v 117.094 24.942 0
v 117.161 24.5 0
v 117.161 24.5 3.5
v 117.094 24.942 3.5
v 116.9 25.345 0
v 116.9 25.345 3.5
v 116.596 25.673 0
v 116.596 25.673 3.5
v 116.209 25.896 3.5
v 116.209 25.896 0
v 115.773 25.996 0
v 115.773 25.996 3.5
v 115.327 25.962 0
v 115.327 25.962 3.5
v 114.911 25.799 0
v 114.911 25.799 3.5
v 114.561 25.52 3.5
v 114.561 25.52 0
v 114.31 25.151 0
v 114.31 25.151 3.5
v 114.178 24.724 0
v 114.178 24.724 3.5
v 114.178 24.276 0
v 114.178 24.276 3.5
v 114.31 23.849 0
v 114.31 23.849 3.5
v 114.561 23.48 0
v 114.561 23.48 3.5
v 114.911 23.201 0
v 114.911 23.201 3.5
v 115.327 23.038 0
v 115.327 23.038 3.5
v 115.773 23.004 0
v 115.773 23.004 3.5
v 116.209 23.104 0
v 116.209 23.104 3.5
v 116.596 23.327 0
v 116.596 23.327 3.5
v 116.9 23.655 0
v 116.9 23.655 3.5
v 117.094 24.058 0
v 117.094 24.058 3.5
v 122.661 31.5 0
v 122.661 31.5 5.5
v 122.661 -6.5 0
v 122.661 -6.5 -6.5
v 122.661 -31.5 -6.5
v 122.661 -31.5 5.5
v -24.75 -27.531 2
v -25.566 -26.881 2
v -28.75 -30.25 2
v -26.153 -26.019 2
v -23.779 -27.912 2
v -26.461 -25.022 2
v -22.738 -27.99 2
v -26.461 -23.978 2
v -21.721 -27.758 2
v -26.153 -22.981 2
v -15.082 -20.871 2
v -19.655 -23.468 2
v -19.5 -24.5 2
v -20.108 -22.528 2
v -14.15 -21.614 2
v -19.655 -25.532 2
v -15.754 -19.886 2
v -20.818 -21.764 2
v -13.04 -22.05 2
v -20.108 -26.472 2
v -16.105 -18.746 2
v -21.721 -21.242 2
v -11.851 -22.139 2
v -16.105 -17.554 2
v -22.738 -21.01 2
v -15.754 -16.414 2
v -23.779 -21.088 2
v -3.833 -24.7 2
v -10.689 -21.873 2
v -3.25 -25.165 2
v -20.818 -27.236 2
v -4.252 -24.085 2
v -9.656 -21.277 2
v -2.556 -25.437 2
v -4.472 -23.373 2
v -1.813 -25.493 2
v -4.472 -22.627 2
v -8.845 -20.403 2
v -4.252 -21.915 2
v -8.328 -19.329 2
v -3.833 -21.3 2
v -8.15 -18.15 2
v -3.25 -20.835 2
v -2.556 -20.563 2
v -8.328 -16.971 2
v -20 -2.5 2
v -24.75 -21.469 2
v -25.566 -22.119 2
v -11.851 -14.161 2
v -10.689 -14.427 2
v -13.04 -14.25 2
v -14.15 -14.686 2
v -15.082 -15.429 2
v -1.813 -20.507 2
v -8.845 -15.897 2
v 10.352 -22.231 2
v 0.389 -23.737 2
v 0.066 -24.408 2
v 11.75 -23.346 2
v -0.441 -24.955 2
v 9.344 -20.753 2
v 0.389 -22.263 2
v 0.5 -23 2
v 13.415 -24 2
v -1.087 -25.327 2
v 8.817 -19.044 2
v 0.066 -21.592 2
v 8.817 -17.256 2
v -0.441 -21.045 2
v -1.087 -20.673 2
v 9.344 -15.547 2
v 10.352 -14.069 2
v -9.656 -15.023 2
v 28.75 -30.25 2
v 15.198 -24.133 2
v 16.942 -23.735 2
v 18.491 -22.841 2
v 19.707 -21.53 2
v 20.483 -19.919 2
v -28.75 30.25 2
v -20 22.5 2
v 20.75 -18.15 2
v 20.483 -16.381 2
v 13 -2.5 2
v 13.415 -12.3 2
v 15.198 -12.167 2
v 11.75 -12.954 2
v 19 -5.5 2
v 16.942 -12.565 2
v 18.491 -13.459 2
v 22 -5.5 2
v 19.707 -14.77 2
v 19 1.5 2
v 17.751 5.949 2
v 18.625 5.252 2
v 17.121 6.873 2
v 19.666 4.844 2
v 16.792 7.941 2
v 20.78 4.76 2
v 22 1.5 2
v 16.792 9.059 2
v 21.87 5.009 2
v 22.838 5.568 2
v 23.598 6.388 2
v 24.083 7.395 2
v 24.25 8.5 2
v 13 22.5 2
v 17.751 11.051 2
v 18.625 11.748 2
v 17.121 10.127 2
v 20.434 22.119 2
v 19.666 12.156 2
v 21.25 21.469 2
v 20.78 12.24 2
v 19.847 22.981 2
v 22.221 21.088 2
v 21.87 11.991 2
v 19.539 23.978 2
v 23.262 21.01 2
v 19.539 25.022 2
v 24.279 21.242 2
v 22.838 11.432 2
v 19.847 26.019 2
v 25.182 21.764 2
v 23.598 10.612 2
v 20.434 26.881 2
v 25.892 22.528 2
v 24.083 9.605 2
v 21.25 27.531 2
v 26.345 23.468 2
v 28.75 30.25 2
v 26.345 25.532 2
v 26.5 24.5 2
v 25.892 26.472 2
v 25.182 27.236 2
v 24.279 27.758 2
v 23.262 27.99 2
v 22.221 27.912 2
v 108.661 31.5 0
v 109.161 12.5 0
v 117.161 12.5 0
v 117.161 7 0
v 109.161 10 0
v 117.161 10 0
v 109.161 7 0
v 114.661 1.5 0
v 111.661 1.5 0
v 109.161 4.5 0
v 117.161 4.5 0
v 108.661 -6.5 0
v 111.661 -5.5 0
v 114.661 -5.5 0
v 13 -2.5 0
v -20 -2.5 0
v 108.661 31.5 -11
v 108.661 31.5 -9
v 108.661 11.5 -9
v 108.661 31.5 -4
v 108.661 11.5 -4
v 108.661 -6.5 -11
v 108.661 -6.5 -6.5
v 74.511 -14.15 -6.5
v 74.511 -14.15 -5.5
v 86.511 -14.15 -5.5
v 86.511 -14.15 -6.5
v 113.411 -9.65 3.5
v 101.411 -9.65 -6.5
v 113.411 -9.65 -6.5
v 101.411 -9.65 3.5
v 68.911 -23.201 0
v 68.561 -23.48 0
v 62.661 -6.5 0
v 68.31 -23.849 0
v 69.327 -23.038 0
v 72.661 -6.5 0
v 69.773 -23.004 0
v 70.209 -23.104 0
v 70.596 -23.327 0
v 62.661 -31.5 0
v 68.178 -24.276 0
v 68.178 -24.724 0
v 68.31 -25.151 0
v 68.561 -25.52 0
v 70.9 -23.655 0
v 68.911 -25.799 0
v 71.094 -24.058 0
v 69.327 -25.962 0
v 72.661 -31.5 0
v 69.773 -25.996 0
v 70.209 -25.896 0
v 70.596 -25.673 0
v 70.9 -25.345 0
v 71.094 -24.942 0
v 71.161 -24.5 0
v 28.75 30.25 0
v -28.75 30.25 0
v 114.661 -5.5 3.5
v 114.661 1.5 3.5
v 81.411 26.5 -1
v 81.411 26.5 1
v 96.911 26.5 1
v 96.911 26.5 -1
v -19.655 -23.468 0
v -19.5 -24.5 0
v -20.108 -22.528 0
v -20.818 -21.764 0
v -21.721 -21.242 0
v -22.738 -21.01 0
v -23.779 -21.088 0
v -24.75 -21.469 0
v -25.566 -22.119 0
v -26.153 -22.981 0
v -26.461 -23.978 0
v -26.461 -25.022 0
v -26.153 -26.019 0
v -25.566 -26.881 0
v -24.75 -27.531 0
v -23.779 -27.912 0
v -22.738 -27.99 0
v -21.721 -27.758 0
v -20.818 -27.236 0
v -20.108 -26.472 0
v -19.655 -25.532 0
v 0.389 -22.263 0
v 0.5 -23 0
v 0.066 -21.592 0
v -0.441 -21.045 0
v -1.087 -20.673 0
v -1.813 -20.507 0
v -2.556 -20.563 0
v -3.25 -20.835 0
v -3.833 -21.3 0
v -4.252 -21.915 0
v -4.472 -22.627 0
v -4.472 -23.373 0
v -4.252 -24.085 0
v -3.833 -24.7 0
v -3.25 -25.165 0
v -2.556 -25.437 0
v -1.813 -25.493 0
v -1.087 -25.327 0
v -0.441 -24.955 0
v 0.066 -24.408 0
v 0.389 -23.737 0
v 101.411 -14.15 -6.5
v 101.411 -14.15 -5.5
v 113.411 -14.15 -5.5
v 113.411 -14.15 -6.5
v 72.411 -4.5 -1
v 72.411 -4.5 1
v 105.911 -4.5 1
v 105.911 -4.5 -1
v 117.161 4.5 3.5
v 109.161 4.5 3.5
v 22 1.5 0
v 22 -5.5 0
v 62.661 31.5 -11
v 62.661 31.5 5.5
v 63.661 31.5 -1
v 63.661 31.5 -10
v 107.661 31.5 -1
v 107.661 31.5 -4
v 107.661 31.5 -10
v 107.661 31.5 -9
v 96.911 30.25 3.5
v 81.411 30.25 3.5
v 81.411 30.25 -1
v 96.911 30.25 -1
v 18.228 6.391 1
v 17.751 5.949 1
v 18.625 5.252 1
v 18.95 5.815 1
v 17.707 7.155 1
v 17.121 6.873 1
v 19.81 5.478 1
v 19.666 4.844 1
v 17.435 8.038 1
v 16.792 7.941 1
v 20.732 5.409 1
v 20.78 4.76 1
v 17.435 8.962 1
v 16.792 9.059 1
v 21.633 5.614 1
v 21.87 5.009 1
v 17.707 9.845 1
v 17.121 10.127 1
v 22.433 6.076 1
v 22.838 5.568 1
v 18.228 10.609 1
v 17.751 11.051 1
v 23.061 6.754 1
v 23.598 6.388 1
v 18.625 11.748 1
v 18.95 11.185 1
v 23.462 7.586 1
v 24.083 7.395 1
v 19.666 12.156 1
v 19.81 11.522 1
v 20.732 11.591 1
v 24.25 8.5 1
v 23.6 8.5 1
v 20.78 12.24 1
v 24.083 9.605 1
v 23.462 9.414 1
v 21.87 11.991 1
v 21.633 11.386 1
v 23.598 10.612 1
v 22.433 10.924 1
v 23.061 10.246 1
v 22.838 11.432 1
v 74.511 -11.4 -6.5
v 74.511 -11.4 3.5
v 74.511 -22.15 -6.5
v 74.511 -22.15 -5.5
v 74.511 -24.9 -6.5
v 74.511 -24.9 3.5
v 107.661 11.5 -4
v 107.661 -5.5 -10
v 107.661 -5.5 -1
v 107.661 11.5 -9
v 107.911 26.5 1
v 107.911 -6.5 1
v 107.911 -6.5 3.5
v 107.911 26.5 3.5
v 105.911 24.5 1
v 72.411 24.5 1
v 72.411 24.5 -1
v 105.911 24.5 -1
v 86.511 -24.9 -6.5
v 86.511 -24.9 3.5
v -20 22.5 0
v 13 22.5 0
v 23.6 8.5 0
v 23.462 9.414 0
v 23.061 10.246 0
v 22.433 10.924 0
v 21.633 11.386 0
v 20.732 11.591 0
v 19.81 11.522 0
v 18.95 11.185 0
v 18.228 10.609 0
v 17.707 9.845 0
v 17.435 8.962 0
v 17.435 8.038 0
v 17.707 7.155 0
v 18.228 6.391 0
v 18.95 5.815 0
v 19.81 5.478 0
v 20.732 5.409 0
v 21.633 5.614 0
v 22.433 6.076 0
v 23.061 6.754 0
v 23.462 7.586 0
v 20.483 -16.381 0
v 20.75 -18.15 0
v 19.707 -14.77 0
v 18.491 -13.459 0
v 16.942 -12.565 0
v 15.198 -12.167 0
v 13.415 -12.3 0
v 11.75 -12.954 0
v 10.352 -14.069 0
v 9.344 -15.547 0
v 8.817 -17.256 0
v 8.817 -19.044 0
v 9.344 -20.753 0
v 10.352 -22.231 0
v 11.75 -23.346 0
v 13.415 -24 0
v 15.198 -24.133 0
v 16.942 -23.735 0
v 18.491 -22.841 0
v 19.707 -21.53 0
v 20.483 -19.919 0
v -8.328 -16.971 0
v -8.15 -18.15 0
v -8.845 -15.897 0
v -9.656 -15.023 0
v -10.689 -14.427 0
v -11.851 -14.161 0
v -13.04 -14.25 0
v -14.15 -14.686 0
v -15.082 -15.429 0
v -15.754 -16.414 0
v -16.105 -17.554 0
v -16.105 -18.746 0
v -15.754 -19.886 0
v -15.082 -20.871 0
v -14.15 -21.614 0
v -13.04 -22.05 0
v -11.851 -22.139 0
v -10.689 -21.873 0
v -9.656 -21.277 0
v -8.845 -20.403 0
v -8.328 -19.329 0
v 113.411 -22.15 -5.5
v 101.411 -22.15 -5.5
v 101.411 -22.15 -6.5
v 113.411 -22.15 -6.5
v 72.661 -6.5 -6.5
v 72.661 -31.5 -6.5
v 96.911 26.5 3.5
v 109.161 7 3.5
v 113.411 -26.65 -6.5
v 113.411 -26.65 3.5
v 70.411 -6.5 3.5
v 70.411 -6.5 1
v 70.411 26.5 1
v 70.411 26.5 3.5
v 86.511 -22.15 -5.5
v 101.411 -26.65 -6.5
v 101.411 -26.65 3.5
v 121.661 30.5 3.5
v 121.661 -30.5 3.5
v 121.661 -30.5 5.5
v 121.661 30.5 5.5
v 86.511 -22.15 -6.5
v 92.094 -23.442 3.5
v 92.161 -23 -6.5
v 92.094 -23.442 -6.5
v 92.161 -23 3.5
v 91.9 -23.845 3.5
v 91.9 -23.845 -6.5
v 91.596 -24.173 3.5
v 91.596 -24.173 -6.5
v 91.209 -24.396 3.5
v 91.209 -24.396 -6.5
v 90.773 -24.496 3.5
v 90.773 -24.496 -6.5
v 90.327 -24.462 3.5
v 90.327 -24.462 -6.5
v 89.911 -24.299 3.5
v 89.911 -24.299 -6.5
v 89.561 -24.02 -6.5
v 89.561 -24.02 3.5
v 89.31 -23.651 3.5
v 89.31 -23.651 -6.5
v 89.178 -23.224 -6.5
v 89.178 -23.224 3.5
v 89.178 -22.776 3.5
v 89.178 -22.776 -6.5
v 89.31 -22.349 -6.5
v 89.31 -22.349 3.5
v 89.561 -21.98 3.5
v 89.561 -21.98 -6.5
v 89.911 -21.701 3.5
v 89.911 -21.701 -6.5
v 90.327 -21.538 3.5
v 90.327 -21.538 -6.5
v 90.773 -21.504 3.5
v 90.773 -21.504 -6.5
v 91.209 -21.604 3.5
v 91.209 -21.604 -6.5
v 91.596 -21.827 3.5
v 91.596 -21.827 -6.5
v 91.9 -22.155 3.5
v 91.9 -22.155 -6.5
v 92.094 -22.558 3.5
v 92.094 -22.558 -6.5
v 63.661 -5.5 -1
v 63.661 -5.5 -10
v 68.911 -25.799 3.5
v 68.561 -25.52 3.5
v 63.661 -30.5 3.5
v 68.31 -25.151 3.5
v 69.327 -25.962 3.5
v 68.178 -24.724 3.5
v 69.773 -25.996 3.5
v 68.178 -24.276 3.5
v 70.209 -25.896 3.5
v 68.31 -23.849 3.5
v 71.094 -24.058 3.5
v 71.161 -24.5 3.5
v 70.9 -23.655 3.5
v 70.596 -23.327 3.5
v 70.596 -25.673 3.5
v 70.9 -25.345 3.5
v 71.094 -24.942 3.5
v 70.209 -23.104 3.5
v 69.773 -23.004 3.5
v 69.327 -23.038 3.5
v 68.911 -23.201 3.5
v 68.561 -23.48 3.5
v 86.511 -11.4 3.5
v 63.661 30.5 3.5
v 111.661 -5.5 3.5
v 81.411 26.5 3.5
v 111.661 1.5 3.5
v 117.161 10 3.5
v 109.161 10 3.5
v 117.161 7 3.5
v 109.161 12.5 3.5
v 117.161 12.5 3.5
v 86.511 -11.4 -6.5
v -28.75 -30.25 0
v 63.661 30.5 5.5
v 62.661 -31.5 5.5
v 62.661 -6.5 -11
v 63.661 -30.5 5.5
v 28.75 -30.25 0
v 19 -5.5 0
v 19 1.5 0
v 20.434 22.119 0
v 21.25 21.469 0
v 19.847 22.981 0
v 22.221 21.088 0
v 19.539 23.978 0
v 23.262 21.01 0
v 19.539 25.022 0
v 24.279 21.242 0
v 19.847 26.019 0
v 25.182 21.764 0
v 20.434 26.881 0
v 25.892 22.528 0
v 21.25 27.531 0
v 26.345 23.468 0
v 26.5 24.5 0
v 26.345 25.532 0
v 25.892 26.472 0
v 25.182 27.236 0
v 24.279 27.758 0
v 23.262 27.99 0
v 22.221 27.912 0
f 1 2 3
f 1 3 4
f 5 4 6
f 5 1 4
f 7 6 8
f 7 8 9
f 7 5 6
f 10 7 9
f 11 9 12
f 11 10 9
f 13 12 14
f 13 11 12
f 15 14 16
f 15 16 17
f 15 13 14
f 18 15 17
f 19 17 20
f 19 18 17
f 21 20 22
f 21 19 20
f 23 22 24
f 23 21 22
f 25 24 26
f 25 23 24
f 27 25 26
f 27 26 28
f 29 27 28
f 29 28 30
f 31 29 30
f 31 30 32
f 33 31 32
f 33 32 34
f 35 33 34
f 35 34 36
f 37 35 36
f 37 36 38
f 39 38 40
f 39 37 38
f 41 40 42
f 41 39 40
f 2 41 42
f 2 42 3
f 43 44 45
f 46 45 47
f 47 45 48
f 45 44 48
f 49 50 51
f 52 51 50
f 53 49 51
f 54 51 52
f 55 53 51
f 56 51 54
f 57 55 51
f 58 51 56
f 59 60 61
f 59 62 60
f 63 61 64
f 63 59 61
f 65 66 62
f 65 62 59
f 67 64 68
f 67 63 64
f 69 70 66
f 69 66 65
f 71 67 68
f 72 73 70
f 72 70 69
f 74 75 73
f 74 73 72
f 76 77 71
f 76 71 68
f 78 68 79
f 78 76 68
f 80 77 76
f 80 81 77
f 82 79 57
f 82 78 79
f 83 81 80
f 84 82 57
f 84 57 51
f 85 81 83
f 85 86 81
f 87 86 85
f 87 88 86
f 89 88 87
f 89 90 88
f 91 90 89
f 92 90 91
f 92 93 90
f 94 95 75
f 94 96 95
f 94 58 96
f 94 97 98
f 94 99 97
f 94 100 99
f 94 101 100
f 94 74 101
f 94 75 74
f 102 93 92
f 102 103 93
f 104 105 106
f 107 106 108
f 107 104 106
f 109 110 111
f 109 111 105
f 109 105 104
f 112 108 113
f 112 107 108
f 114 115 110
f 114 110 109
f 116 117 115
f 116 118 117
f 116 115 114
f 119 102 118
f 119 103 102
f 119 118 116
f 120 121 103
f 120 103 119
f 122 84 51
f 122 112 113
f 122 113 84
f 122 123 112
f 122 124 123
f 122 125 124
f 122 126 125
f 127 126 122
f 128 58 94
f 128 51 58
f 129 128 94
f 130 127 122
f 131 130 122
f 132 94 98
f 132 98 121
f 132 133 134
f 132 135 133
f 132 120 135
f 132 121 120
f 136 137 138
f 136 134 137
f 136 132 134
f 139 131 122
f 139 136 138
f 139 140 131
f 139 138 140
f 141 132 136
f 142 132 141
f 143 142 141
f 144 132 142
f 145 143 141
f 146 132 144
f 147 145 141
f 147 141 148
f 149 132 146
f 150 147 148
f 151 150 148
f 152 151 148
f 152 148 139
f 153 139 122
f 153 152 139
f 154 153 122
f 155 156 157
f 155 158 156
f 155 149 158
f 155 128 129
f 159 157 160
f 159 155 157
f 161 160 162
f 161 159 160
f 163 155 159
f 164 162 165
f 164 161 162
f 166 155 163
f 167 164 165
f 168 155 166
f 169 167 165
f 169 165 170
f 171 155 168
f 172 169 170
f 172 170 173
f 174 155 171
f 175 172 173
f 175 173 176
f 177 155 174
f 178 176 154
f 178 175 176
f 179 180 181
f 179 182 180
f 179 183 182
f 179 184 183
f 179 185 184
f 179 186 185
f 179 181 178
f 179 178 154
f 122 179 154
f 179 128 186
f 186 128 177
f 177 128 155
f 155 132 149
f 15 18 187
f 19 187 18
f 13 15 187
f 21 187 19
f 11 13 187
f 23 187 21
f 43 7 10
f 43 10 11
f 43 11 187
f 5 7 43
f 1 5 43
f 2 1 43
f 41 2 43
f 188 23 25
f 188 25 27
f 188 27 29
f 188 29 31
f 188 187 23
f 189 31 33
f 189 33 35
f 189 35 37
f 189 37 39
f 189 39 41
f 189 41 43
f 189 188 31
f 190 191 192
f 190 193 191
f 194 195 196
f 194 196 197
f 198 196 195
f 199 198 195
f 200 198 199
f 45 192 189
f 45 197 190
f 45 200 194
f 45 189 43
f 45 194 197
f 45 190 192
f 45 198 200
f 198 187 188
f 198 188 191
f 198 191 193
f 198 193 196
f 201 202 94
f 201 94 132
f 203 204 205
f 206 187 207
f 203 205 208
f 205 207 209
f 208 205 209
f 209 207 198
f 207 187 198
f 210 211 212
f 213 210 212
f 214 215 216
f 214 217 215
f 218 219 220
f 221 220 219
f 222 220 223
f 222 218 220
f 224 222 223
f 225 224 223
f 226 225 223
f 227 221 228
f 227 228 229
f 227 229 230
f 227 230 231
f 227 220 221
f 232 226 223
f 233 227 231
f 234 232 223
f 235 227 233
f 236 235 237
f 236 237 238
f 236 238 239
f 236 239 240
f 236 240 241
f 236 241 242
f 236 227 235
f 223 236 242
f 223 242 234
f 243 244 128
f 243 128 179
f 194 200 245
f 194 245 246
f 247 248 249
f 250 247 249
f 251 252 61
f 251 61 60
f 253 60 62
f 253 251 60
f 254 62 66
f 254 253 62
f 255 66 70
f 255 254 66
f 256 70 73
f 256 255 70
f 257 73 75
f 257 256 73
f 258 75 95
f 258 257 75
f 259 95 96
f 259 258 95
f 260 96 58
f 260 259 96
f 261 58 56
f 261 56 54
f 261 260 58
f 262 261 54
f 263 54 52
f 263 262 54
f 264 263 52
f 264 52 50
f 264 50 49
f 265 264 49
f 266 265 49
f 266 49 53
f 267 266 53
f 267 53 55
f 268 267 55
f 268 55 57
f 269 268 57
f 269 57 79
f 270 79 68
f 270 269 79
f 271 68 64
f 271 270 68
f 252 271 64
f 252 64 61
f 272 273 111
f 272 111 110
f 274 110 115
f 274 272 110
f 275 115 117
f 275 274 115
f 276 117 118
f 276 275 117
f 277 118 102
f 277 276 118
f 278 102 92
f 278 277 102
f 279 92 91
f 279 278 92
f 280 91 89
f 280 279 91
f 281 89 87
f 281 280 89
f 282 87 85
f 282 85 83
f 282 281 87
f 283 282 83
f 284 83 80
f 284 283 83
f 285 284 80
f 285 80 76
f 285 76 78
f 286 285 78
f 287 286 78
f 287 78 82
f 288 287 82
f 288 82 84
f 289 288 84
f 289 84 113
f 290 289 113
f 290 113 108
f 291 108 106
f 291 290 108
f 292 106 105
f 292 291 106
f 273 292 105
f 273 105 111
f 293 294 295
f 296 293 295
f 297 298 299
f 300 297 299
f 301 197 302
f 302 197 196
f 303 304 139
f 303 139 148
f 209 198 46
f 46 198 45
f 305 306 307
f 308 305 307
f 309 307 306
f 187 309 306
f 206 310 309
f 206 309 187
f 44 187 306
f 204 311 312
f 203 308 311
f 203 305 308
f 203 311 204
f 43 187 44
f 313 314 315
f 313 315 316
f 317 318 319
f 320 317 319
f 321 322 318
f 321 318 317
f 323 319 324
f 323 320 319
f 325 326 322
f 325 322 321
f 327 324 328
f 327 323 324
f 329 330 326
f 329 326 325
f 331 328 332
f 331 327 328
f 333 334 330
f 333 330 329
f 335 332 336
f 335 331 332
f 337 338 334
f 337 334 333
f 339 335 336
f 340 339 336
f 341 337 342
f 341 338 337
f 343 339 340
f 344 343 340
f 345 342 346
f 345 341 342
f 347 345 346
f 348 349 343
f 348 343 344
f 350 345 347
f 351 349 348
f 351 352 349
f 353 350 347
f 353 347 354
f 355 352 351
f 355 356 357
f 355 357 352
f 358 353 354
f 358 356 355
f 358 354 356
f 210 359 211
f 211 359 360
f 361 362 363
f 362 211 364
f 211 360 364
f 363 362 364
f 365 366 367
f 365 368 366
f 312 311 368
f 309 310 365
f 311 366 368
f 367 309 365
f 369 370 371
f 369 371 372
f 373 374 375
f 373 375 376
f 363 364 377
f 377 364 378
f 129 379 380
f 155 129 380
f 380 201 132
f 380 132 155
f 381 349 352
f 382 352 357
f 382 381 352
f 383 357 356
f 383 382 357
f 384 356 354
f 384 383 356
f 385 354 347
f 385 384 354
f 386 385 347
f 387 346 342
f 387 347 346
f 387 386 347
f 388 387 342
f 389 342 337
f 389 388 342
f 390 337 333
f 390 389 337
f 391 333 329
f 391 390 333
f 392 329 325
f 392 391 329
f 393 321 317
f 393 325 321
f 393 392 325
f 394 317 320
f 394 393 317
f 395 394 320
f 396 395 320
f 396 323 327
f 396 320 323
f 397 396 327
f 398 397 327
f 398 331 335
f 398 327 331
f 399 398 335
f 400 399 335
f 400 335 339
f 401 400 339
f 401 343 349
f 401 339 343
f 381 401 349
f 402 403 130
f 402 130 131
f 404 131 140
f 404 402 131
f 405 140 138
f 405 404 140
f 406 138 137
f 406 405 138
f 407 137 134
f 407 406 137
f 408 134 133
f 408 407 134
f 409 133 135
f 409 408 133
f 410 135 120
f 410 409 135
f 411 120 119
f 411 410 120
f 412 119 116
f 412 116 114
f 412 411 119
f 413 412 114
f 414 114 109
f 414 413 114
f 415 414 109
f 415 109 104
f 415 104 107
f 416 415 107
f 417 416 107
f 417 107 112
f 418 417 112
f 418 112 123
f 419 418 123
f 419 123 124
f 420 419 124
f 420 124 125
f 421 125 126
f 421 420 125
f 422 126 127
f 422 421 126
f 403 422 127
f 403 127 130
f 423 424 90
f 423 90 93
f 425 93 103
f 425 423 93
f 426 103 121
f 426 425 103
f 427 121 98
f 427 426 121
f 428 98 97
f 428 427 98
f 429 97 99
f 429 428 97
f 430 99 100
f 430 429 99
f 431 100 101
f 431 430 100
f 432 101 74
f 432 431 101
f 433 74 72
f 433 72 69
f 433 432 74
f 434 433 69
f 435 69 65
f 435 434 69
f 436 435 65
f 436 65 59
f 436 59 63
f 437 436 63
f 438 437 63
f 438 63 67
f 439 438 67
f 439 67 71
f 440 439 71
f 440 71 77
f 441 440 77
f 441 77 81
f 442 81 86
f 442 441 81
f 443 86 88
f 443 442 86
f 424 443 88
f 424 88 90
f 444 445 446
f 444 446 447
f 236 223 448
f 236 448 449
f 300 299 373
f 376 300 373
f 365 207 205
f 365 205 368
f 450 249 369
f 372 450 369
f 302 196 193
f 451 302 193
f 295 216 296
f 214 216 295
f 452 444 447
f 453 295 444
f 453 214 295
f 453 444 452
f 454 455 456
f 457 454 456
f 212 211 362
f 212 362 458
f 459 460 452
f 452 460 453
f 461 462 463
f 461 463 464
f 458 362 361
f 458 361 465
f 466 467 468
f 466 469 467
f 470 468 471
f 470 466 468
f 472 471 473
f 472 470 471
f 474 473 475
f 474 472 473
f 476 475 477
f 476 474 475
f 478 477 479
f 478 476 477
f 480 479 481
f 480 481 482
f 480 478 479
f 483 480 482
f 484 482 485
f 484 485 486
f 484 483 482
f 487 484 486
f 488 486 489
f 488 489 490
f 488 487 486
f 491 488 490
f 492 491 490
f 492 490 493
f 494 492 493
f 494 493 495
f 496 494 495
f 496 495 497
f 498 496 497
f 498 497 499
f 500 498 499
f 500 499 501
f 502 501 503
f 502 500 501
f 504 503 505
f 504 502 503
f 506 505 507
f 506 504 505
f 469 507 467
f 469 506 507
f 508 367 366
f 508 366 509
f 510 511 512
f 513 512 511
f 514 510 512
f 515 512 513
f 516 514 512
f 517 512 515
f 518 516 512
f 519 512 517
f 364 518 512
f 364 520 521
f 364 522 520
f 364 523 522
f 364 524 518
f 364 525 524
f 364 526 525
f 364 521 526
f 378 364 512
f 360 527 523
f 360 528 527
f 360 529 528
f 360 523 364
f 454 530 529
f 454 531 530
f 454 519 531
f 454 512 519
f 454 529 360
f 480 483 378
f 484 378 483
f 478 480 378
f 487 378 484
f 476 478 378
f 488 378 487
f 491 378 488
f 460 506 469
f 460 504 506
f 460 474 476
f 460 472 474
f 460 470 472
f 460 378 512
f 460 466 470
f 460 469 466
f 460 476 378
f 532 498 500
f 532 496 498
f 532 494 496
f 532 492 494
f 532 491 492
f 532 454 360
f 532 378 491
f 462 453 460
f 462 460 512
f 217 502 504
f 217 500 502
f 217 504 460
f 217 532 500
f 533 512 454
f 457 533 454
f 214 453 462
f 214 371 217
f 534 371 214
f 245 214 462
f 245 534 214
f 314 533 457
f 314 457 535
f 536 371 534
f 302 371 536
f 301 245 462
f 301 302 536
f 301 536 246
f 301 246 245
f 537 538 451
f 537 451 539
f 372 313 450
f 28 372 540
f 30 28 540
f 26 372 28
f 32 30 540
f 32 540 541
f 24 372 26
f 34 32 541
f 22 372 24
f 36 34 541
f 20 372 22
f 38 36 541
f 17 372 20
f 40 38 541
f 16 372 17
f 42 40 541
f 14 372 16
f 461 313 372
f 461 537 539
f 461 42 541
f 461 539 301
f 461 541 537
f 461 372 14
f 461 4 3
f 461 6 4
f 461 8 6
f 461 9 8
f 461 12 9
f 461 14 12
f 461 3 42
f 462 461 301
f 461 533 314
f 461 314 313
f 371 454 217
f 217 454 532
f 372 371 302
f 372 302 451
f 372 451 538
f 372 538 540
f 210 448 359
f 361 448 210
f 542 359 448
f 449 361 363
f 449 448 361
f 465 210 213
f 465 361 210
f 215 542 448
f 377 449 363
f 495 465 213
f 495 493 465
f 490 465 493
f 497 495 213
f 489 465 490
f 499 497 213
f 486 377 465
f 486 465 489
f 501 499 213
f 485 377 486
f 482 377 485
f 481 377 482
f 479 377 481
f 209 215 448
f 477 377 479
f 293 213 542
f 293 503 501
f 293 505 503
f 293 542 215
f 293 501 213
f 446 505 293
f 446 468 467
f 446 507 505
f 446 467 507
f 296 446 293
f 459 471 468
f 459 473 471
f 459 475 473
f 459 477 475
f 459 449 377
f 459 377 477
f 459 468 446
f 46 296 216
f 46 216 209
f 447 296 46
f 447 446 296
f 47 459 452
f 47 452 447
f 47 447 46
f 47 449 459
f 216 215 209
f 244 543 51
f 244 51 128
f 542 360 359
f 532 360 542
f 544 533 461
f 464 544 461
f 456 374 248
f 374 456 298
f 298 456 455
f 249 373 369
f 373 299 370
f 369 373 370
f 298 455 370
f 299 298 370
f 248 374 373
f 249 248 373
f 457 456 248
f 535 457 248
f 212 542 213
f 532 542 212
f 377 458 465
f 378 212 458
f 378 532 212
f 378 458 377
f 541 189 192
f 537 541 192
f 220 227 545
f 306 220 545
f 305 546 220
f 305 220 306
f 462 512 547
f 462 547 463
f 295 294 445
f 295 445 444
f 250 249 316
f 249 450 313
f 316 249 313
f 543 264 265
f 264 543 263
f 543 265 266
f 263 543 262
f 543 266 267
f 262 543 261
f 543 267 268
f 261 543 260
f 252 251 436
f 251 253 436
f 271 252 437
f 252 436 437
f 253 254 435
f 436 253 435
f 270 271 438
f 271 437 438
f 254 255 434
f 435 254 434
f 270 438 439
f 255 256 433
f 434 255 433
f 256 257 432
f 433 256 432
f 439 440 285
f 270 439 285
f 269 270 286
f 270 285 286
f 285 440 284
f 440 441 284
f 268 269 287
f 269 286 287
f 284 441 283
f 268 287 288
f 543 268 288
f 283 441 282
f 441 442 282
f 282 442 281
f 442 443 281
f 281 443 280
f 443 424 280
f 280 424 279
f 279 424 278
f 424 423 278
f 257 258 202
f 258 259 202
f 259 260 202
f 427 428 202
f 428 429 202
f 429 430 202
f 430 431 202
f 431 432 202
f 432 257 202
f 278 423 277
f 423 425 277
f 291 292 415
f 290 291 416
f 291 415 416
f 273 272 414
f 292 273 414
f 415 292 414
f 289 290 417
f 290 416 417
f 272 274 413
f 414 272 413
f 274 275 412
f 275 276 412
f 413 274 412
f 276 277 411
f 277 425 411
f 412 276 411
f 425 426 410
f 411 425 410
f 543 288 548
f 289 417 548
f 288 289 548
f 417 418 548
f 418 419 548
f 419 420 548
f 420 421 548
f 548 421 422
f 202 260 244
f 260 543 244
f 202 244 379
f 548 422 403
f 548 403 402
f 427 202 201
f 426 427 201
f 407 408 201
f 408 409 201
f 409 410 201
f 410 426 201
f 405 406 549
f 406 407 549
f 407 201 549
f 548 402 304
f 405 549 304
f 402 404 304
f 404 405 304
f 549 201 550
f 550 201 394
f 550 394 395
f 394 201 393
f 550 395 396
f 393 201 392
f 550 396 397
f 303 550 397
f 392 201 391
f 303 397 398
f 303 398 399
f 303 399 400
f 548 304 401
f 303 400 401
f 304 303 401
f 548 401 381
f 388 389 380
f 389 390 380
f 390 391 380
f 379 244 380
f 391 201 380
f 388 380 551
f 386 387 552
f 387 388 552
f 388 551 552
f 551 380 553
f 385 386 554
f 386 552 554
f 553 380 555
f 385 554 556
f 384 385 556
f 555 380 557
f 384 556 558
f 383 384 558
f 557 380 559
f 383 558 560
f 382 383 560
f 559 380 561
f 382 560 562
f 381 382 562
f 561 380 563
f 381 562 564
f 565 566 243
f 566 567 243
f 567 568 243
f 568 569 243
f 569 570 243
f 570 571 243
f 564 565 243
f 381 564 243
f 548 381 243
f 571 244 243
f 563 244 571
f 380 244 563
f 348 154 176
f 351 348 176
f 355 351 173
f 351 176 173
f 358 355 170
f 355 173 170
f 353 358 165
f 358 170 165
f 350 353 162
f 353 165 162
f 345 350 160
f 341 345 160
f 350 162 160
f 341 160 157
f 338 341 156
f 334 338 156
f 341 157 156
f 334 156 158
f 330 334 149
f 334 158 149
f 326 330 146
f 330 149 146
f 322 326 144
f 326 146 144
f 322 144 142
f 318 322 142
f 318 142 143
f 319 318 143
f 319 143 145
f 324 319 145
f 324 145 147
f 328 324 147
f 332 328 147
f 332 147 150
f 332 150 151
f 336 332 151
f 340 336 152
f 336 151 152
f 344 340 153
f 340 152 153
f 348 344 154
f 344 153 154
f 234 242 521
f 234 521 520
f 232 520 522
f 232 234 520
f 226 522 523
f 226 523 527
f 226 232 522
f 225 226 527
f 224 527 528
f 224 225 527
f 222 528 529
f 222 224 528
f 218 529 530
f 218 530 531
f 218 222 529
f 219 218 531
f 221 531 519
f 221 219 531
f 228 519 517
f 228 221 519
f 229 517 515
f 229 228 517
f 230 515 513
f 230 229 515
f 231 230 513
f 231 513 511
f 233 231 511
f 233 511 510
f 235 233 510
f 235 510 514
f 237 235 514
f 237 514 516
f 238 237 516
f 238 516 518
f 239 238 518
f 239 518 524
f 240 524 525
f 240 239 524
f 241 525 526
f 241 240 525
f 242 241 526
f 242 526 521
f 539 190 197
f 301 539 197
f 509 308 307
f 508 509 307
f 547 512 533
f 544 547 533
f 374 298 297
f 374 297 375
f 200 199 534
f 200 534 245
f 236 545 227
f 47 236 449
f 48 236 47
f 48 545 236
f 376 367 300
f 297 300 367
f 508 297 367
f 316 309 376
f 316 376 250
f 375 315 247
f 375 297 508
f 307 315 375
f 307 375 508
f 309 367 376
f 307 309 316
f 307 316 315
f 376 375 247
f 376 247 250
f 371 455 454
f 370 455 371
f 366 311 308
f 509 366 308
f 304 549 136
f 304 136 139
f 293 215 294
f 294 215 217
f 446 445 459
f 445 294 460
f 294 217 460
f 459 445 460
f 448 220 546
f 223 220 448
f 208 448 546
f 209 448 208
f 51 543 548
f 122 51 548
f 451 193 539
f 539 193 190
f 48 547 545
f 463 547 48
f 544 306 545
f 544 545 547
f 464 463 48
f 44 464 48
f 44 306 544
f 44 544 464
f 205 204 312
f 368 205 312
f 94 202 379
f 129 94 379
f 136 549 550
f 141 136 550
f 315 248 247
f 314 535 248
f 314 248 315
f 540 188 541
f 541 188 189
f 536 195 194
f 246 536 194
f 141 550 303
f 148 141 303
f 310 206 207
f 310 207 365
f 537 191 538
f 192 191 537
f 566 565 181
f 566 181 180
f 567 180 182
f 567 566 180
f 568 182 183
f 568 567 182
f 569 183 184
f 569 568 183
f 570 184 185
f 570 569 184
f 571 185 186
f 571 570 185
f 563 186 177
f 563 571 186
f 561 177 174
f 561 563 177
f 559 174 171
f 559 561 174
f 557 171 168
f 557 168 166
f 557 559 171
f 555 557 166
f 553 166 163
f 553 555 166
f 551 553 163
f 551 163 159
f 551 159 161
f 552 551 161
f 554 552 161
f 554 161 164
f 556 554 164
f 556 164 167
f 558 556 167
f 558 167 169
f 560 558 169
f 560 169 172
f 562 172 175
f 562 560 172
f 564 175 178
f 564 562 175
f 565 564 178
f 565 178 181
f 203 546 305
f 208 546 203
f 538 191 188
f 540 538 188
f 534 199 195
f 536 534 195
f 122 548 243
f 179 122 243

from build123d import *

# Parameters (mm, degrees)
F1_W      = 60
F1_H      = 63
F1_R      = 1.5
F1_W_2    = 3
F1_H_2    = 7
F1_W_3    = 37.5
F1_H_3    = 33
F1_W_4    = 12
F1_H_4    = 8
F1_W_5    = 8
F1_H_5    = 3
F2_DEPTH  = 3.5
F4_W      = 37.5
F4_H      = 33
F4_W_2    = 33.5
F4_H_2    = 29
F5_DEPTH  = 1
F3_W      = 15.5
F3_H      = 3.75
F6_DEPTH  = 2.5
F0_W      = 57.5
F0_H      = 60.5
F0_R      = 3.5
F0_R_2    = 2.5
F0_R_3    = 4
F0_R_4    = 6
F0_W_2    = 3
F0_H_2    = 7
F0_W_3    = 33
F0_H_3    = 25
F0_R_5    = 3.1
F8_DEPTH  = 2
F10_W     = 46
F10_H     = 38
F11_DEPTH = 11
F12_W     = 44
F12_H     = 9
F13_DEPTH = 37
F14_W     = 1
F14_H     = 5
F15_DEPTH = 20
F16_W     = 33.5
F16_H     = 29
F16_W_2   = 15.5
F16_H_2   = 3.75
F17_DEPTH = 4
F18_W     = 60
F18_H     = 63
F18_W_2   = 58
F18_H_2   = 61
F19_DEPTH = 2
F20_W     = 50
F20_H     = 25
F20_W_2   = 12
F20_H_2   = 2.75
F20_H_3   = 4.5
F20_R     = 1.5
F21_DEPTH = 6.5
F22_W     = 12
F22_H     = 13.5
F22_H_2   = 17
F23_DEPTH = 9
F26_R     = 3.75
F27_DEPTH = 1


# Not quite as in the source:
# - a feature names something its author has since deleted; it is built from what else it names


with BuildPart() as f2:
    # F1 (on Top) → F2 (new body)
    with BuildSketch(Plane.XY):
        with Locations((92.6610440163, 0)):
            Rectangle(F1_W, F1_H)
        with Locations((69.6610440163, -24.5)):
            Circle(F1_R, mode=Mode.SUBTRACT)
        Polygon((86.5110440163, -22.15), (86.5110440163, -24.9), (74.5110440163, -24.9), (74.5110440163, -22.15), (74.5110440163, -14.15), (74.5110440163, -11.4), (86.5110440163, -11.4), (86.5110440163, -14.15), align=None, mode=Mode.SUBTRACT)
        with Locations((90.6610440163, -23)):
            Circle(F1_R, mode=Mode.SUBTRACT)
        Polygon((113.4110440163, -22.15), (113.4110440163, -26.65), (101.4110440163, -26.65), (101.4110440163, -22.15), (101.4110440163, -14.15), (101.4110440163, -9.65), (113.4110440163, -9.65), (113.4110440163, -14.15), align=None, mode=Mode.SUBTRACT)
        with Locations((113.1610440163, -2)):
            Rectangle(F1_W_2, F1_H_2, mode=Mode.SUBTRACT)
        with Locations((89.1610440163, 10)):
            Rectangle(F1_W_3, F1_H_3, mode=Mode.SUBTRACT)
        Polygon((117.1610440163, 7), (117.1610440163, 4.5), (109.1610440163, 4.5), (109.1610440163, 7), (109.1610440163, 10), (109.1610440163, 12.5), (117.1610440163, 12.5), (117.1610440163, 10), align=None, mode=Mode.SUBTRACT)
        with Locations((115.6610440163, 24.5)):
            Circle(F1_R, mode=Mode.SUBTRACT)
        with Locations((80.5110440163, -18.15)):
            Rectangle(F1_W_4, F1_H_4)
        with Locations((107.4110440163, -18.15)):
            Rectangle(F1_W_4, F1_H_4)
        with Locations((113.1610440163, 8.5)):
            Rectangle(F1_W_5, F1_H_5)
    extrude(amount=F2_DEPTH)

    # F4 (on face) → F5 (join)
    with BuildSketch(Plane(origin=(0, 0, 0), x_dir=(1, 0, 0), z_dir=(0, 0, -1))):
        with Locations((89.1610440163, -10)):
            Rectangle(F4_W, F4_H)
        with Locations((89.1610440163, -10)):
            Rectangle(F4_W_2, F4_H_2, mode=Mode.SUBTRACT)
    extrude(amount=-F5_DEPTH)

    # F3 (on face) → F6 (cut)
    with BuildSketch(Plane.XY.offset(3.5)):
        with Locations((89.1610440163, 28.375)):
            Rectangle(F3_W, F3_H)
    extrude(amount=-F6_DEPTH, mode=Mode.SUBTRACT)

    # F10 (on face) → F11 (join)
    with BuildSketch(Plane(origin=(0, 0, 0), x_dir=(1, 0, 0), z_dir=(0, 0, -1))):
        with Locations((85.6610440163, -12.5)):
            Rectangle(F10_W, F10_H)
    extrude(amount=F11_DEPTH)

    # F12 (on face) → F13 (cut)
    with BuildSketch(Plane(origin=(0, 31.5, 0), x_dir=(-1, 0, 0), z_dir=(0, 1, 0))):
        with Locations((-85.6610440163, -5.5)):
            Rectangle(F12_W, F12_H)
    extrude(amount=-F13_DEPTH, mode=Mode.SUBTRACT)

    # F14 (on face) → F15 (cut)
    with BuildSketch(Plane(origin=(0, 31.5, 0), x_dir=(-1, 0, 0), z_dir=(0, 1, 0))):
        with Locations((-108.1610440163, -6.5)):
            Rectangle(F14_W, F14_H)
    extrude(amount=-F15_DEPTH, mode=Mode.SUBTRACT)

    # F16 (on face) → F17 (cut)
    with BuildSketch(Plane.XY.offset(1)):
        with Locations((89.1610440163, 10)):
            Rectangle(F16_W, F16_H)
        with Locations((89.1610440163, 28.375)):
            Rectangle(F16_W_2, F16_H_2)
    extrude(amount=-F17_DEPTH, mode=Mode.SUBTRACT)

    # F18 (on face) → F19 (join)
    with BuildSketch(Plane.XY.offset(3.5)):
        with Locations((92.6610440163, 0)):
            Rectangle(F18_W, F18_H)
        with Locations((92.6610440163, 0)):
            Rectangle(F18_W_2, F18_H_2, mode=Mode.SUBTRACT)
    extrude(amount=F19_DEPTH)

    # F20 (on face) → F21 (join)
    with BuildSketch(Plane(origin=(0, 0, 0), x_dir=(1, 0, 0), z_dir=(0, 0, -1))):
        with Locations((97.6610440163, 19)):
            Rectangle(F20_W, F20_H)
        with Locations((80.5110440163, 12.775)):
            Rectangle(F20_W_2, F20_H_2, mode=Mode.SUBTRACT)
        with Locations((107.4110440163, 11.9)):
            Rectangle(F20_W_2, F20_H_3, mode=Mode.SUBTRACT)
        with Locations((80.5110440163, 23.525)):
            Rectangle(F20_W_2, F20_H_2, mode=Mode.SUBTRACT)
        with Locations((90.6610440163, 23)):
            Circle(F20_R, mode=Mode.SUBTRACT)
        with Locations((107.4110440163, 24.4)):
            Rectangle(F20_W_2, F20_H_3, mode=Mode.SUBTRACT)
    extrude(amount=F21_DEPTH)

    # F22 (on face) → F23 (cut)
    with BuildSketch(Plane.XY.offset(3.5)):
        with Locations((80.5110440163, -18.15)):
            Rectangle(F22_W, F22_H)
        with Locations((107.4110440163, -18.15)):
            Rectangle(F22_W, F22_H_2)
    extrude(amount=-F23_DEPTH, mode=Mode.SUBTRACT)


with BuildPart() as f8:
    # F0 (on Top) → F8 (new body)
    with BuildSketch(Plane.XY):
        Rectangle(F0_W, F0_H)
        with Locations((-23, -24.5)):
            Circle(F0_R, mode=Mode.SUBTRACT)
        with Locations((-2, -23)):
            Circle(F0_R_2, mode=Mode.SUBTRACT)
        with Locations((-12.15, -18.15)):
            Circle(F0_R_3, mode=Mode.SUBTRACT)
        with Locations((14.75, -18.15)):
            Circle(F0_R_4, mode=Mode.SUBTRACT)
        with Locations((20.5, -2)):
            Rectangle(F0_W_2, F0_H_2, mode=Mode.SUBTRACT)
        with Locations((-3.5, 10)):
            Rectangle(F0_W_3, F0_H_3, mode=Mode.SUBTRACT)
        with Locations((20.5, 8.5)):
            Circle(F0_R_5, mode=Mode.SUBTRACT)
        with Locations((23, 24.5)):
            Circle(F0_R, mode=Mode.SUBTRACT)
    extrude(amount=F8_DEPTH)

    # F26 (on face) → F27 (cut)
    with BuildSketch(Plane.XY.offset(2)):
        with Locations((20.5, 8.5)):
            Circle(F26_R)
    extrude(amount=-F27_DEPTH, mode=Mode.SUBTRACT)


solid = Compound([f2.part, f8.part])
